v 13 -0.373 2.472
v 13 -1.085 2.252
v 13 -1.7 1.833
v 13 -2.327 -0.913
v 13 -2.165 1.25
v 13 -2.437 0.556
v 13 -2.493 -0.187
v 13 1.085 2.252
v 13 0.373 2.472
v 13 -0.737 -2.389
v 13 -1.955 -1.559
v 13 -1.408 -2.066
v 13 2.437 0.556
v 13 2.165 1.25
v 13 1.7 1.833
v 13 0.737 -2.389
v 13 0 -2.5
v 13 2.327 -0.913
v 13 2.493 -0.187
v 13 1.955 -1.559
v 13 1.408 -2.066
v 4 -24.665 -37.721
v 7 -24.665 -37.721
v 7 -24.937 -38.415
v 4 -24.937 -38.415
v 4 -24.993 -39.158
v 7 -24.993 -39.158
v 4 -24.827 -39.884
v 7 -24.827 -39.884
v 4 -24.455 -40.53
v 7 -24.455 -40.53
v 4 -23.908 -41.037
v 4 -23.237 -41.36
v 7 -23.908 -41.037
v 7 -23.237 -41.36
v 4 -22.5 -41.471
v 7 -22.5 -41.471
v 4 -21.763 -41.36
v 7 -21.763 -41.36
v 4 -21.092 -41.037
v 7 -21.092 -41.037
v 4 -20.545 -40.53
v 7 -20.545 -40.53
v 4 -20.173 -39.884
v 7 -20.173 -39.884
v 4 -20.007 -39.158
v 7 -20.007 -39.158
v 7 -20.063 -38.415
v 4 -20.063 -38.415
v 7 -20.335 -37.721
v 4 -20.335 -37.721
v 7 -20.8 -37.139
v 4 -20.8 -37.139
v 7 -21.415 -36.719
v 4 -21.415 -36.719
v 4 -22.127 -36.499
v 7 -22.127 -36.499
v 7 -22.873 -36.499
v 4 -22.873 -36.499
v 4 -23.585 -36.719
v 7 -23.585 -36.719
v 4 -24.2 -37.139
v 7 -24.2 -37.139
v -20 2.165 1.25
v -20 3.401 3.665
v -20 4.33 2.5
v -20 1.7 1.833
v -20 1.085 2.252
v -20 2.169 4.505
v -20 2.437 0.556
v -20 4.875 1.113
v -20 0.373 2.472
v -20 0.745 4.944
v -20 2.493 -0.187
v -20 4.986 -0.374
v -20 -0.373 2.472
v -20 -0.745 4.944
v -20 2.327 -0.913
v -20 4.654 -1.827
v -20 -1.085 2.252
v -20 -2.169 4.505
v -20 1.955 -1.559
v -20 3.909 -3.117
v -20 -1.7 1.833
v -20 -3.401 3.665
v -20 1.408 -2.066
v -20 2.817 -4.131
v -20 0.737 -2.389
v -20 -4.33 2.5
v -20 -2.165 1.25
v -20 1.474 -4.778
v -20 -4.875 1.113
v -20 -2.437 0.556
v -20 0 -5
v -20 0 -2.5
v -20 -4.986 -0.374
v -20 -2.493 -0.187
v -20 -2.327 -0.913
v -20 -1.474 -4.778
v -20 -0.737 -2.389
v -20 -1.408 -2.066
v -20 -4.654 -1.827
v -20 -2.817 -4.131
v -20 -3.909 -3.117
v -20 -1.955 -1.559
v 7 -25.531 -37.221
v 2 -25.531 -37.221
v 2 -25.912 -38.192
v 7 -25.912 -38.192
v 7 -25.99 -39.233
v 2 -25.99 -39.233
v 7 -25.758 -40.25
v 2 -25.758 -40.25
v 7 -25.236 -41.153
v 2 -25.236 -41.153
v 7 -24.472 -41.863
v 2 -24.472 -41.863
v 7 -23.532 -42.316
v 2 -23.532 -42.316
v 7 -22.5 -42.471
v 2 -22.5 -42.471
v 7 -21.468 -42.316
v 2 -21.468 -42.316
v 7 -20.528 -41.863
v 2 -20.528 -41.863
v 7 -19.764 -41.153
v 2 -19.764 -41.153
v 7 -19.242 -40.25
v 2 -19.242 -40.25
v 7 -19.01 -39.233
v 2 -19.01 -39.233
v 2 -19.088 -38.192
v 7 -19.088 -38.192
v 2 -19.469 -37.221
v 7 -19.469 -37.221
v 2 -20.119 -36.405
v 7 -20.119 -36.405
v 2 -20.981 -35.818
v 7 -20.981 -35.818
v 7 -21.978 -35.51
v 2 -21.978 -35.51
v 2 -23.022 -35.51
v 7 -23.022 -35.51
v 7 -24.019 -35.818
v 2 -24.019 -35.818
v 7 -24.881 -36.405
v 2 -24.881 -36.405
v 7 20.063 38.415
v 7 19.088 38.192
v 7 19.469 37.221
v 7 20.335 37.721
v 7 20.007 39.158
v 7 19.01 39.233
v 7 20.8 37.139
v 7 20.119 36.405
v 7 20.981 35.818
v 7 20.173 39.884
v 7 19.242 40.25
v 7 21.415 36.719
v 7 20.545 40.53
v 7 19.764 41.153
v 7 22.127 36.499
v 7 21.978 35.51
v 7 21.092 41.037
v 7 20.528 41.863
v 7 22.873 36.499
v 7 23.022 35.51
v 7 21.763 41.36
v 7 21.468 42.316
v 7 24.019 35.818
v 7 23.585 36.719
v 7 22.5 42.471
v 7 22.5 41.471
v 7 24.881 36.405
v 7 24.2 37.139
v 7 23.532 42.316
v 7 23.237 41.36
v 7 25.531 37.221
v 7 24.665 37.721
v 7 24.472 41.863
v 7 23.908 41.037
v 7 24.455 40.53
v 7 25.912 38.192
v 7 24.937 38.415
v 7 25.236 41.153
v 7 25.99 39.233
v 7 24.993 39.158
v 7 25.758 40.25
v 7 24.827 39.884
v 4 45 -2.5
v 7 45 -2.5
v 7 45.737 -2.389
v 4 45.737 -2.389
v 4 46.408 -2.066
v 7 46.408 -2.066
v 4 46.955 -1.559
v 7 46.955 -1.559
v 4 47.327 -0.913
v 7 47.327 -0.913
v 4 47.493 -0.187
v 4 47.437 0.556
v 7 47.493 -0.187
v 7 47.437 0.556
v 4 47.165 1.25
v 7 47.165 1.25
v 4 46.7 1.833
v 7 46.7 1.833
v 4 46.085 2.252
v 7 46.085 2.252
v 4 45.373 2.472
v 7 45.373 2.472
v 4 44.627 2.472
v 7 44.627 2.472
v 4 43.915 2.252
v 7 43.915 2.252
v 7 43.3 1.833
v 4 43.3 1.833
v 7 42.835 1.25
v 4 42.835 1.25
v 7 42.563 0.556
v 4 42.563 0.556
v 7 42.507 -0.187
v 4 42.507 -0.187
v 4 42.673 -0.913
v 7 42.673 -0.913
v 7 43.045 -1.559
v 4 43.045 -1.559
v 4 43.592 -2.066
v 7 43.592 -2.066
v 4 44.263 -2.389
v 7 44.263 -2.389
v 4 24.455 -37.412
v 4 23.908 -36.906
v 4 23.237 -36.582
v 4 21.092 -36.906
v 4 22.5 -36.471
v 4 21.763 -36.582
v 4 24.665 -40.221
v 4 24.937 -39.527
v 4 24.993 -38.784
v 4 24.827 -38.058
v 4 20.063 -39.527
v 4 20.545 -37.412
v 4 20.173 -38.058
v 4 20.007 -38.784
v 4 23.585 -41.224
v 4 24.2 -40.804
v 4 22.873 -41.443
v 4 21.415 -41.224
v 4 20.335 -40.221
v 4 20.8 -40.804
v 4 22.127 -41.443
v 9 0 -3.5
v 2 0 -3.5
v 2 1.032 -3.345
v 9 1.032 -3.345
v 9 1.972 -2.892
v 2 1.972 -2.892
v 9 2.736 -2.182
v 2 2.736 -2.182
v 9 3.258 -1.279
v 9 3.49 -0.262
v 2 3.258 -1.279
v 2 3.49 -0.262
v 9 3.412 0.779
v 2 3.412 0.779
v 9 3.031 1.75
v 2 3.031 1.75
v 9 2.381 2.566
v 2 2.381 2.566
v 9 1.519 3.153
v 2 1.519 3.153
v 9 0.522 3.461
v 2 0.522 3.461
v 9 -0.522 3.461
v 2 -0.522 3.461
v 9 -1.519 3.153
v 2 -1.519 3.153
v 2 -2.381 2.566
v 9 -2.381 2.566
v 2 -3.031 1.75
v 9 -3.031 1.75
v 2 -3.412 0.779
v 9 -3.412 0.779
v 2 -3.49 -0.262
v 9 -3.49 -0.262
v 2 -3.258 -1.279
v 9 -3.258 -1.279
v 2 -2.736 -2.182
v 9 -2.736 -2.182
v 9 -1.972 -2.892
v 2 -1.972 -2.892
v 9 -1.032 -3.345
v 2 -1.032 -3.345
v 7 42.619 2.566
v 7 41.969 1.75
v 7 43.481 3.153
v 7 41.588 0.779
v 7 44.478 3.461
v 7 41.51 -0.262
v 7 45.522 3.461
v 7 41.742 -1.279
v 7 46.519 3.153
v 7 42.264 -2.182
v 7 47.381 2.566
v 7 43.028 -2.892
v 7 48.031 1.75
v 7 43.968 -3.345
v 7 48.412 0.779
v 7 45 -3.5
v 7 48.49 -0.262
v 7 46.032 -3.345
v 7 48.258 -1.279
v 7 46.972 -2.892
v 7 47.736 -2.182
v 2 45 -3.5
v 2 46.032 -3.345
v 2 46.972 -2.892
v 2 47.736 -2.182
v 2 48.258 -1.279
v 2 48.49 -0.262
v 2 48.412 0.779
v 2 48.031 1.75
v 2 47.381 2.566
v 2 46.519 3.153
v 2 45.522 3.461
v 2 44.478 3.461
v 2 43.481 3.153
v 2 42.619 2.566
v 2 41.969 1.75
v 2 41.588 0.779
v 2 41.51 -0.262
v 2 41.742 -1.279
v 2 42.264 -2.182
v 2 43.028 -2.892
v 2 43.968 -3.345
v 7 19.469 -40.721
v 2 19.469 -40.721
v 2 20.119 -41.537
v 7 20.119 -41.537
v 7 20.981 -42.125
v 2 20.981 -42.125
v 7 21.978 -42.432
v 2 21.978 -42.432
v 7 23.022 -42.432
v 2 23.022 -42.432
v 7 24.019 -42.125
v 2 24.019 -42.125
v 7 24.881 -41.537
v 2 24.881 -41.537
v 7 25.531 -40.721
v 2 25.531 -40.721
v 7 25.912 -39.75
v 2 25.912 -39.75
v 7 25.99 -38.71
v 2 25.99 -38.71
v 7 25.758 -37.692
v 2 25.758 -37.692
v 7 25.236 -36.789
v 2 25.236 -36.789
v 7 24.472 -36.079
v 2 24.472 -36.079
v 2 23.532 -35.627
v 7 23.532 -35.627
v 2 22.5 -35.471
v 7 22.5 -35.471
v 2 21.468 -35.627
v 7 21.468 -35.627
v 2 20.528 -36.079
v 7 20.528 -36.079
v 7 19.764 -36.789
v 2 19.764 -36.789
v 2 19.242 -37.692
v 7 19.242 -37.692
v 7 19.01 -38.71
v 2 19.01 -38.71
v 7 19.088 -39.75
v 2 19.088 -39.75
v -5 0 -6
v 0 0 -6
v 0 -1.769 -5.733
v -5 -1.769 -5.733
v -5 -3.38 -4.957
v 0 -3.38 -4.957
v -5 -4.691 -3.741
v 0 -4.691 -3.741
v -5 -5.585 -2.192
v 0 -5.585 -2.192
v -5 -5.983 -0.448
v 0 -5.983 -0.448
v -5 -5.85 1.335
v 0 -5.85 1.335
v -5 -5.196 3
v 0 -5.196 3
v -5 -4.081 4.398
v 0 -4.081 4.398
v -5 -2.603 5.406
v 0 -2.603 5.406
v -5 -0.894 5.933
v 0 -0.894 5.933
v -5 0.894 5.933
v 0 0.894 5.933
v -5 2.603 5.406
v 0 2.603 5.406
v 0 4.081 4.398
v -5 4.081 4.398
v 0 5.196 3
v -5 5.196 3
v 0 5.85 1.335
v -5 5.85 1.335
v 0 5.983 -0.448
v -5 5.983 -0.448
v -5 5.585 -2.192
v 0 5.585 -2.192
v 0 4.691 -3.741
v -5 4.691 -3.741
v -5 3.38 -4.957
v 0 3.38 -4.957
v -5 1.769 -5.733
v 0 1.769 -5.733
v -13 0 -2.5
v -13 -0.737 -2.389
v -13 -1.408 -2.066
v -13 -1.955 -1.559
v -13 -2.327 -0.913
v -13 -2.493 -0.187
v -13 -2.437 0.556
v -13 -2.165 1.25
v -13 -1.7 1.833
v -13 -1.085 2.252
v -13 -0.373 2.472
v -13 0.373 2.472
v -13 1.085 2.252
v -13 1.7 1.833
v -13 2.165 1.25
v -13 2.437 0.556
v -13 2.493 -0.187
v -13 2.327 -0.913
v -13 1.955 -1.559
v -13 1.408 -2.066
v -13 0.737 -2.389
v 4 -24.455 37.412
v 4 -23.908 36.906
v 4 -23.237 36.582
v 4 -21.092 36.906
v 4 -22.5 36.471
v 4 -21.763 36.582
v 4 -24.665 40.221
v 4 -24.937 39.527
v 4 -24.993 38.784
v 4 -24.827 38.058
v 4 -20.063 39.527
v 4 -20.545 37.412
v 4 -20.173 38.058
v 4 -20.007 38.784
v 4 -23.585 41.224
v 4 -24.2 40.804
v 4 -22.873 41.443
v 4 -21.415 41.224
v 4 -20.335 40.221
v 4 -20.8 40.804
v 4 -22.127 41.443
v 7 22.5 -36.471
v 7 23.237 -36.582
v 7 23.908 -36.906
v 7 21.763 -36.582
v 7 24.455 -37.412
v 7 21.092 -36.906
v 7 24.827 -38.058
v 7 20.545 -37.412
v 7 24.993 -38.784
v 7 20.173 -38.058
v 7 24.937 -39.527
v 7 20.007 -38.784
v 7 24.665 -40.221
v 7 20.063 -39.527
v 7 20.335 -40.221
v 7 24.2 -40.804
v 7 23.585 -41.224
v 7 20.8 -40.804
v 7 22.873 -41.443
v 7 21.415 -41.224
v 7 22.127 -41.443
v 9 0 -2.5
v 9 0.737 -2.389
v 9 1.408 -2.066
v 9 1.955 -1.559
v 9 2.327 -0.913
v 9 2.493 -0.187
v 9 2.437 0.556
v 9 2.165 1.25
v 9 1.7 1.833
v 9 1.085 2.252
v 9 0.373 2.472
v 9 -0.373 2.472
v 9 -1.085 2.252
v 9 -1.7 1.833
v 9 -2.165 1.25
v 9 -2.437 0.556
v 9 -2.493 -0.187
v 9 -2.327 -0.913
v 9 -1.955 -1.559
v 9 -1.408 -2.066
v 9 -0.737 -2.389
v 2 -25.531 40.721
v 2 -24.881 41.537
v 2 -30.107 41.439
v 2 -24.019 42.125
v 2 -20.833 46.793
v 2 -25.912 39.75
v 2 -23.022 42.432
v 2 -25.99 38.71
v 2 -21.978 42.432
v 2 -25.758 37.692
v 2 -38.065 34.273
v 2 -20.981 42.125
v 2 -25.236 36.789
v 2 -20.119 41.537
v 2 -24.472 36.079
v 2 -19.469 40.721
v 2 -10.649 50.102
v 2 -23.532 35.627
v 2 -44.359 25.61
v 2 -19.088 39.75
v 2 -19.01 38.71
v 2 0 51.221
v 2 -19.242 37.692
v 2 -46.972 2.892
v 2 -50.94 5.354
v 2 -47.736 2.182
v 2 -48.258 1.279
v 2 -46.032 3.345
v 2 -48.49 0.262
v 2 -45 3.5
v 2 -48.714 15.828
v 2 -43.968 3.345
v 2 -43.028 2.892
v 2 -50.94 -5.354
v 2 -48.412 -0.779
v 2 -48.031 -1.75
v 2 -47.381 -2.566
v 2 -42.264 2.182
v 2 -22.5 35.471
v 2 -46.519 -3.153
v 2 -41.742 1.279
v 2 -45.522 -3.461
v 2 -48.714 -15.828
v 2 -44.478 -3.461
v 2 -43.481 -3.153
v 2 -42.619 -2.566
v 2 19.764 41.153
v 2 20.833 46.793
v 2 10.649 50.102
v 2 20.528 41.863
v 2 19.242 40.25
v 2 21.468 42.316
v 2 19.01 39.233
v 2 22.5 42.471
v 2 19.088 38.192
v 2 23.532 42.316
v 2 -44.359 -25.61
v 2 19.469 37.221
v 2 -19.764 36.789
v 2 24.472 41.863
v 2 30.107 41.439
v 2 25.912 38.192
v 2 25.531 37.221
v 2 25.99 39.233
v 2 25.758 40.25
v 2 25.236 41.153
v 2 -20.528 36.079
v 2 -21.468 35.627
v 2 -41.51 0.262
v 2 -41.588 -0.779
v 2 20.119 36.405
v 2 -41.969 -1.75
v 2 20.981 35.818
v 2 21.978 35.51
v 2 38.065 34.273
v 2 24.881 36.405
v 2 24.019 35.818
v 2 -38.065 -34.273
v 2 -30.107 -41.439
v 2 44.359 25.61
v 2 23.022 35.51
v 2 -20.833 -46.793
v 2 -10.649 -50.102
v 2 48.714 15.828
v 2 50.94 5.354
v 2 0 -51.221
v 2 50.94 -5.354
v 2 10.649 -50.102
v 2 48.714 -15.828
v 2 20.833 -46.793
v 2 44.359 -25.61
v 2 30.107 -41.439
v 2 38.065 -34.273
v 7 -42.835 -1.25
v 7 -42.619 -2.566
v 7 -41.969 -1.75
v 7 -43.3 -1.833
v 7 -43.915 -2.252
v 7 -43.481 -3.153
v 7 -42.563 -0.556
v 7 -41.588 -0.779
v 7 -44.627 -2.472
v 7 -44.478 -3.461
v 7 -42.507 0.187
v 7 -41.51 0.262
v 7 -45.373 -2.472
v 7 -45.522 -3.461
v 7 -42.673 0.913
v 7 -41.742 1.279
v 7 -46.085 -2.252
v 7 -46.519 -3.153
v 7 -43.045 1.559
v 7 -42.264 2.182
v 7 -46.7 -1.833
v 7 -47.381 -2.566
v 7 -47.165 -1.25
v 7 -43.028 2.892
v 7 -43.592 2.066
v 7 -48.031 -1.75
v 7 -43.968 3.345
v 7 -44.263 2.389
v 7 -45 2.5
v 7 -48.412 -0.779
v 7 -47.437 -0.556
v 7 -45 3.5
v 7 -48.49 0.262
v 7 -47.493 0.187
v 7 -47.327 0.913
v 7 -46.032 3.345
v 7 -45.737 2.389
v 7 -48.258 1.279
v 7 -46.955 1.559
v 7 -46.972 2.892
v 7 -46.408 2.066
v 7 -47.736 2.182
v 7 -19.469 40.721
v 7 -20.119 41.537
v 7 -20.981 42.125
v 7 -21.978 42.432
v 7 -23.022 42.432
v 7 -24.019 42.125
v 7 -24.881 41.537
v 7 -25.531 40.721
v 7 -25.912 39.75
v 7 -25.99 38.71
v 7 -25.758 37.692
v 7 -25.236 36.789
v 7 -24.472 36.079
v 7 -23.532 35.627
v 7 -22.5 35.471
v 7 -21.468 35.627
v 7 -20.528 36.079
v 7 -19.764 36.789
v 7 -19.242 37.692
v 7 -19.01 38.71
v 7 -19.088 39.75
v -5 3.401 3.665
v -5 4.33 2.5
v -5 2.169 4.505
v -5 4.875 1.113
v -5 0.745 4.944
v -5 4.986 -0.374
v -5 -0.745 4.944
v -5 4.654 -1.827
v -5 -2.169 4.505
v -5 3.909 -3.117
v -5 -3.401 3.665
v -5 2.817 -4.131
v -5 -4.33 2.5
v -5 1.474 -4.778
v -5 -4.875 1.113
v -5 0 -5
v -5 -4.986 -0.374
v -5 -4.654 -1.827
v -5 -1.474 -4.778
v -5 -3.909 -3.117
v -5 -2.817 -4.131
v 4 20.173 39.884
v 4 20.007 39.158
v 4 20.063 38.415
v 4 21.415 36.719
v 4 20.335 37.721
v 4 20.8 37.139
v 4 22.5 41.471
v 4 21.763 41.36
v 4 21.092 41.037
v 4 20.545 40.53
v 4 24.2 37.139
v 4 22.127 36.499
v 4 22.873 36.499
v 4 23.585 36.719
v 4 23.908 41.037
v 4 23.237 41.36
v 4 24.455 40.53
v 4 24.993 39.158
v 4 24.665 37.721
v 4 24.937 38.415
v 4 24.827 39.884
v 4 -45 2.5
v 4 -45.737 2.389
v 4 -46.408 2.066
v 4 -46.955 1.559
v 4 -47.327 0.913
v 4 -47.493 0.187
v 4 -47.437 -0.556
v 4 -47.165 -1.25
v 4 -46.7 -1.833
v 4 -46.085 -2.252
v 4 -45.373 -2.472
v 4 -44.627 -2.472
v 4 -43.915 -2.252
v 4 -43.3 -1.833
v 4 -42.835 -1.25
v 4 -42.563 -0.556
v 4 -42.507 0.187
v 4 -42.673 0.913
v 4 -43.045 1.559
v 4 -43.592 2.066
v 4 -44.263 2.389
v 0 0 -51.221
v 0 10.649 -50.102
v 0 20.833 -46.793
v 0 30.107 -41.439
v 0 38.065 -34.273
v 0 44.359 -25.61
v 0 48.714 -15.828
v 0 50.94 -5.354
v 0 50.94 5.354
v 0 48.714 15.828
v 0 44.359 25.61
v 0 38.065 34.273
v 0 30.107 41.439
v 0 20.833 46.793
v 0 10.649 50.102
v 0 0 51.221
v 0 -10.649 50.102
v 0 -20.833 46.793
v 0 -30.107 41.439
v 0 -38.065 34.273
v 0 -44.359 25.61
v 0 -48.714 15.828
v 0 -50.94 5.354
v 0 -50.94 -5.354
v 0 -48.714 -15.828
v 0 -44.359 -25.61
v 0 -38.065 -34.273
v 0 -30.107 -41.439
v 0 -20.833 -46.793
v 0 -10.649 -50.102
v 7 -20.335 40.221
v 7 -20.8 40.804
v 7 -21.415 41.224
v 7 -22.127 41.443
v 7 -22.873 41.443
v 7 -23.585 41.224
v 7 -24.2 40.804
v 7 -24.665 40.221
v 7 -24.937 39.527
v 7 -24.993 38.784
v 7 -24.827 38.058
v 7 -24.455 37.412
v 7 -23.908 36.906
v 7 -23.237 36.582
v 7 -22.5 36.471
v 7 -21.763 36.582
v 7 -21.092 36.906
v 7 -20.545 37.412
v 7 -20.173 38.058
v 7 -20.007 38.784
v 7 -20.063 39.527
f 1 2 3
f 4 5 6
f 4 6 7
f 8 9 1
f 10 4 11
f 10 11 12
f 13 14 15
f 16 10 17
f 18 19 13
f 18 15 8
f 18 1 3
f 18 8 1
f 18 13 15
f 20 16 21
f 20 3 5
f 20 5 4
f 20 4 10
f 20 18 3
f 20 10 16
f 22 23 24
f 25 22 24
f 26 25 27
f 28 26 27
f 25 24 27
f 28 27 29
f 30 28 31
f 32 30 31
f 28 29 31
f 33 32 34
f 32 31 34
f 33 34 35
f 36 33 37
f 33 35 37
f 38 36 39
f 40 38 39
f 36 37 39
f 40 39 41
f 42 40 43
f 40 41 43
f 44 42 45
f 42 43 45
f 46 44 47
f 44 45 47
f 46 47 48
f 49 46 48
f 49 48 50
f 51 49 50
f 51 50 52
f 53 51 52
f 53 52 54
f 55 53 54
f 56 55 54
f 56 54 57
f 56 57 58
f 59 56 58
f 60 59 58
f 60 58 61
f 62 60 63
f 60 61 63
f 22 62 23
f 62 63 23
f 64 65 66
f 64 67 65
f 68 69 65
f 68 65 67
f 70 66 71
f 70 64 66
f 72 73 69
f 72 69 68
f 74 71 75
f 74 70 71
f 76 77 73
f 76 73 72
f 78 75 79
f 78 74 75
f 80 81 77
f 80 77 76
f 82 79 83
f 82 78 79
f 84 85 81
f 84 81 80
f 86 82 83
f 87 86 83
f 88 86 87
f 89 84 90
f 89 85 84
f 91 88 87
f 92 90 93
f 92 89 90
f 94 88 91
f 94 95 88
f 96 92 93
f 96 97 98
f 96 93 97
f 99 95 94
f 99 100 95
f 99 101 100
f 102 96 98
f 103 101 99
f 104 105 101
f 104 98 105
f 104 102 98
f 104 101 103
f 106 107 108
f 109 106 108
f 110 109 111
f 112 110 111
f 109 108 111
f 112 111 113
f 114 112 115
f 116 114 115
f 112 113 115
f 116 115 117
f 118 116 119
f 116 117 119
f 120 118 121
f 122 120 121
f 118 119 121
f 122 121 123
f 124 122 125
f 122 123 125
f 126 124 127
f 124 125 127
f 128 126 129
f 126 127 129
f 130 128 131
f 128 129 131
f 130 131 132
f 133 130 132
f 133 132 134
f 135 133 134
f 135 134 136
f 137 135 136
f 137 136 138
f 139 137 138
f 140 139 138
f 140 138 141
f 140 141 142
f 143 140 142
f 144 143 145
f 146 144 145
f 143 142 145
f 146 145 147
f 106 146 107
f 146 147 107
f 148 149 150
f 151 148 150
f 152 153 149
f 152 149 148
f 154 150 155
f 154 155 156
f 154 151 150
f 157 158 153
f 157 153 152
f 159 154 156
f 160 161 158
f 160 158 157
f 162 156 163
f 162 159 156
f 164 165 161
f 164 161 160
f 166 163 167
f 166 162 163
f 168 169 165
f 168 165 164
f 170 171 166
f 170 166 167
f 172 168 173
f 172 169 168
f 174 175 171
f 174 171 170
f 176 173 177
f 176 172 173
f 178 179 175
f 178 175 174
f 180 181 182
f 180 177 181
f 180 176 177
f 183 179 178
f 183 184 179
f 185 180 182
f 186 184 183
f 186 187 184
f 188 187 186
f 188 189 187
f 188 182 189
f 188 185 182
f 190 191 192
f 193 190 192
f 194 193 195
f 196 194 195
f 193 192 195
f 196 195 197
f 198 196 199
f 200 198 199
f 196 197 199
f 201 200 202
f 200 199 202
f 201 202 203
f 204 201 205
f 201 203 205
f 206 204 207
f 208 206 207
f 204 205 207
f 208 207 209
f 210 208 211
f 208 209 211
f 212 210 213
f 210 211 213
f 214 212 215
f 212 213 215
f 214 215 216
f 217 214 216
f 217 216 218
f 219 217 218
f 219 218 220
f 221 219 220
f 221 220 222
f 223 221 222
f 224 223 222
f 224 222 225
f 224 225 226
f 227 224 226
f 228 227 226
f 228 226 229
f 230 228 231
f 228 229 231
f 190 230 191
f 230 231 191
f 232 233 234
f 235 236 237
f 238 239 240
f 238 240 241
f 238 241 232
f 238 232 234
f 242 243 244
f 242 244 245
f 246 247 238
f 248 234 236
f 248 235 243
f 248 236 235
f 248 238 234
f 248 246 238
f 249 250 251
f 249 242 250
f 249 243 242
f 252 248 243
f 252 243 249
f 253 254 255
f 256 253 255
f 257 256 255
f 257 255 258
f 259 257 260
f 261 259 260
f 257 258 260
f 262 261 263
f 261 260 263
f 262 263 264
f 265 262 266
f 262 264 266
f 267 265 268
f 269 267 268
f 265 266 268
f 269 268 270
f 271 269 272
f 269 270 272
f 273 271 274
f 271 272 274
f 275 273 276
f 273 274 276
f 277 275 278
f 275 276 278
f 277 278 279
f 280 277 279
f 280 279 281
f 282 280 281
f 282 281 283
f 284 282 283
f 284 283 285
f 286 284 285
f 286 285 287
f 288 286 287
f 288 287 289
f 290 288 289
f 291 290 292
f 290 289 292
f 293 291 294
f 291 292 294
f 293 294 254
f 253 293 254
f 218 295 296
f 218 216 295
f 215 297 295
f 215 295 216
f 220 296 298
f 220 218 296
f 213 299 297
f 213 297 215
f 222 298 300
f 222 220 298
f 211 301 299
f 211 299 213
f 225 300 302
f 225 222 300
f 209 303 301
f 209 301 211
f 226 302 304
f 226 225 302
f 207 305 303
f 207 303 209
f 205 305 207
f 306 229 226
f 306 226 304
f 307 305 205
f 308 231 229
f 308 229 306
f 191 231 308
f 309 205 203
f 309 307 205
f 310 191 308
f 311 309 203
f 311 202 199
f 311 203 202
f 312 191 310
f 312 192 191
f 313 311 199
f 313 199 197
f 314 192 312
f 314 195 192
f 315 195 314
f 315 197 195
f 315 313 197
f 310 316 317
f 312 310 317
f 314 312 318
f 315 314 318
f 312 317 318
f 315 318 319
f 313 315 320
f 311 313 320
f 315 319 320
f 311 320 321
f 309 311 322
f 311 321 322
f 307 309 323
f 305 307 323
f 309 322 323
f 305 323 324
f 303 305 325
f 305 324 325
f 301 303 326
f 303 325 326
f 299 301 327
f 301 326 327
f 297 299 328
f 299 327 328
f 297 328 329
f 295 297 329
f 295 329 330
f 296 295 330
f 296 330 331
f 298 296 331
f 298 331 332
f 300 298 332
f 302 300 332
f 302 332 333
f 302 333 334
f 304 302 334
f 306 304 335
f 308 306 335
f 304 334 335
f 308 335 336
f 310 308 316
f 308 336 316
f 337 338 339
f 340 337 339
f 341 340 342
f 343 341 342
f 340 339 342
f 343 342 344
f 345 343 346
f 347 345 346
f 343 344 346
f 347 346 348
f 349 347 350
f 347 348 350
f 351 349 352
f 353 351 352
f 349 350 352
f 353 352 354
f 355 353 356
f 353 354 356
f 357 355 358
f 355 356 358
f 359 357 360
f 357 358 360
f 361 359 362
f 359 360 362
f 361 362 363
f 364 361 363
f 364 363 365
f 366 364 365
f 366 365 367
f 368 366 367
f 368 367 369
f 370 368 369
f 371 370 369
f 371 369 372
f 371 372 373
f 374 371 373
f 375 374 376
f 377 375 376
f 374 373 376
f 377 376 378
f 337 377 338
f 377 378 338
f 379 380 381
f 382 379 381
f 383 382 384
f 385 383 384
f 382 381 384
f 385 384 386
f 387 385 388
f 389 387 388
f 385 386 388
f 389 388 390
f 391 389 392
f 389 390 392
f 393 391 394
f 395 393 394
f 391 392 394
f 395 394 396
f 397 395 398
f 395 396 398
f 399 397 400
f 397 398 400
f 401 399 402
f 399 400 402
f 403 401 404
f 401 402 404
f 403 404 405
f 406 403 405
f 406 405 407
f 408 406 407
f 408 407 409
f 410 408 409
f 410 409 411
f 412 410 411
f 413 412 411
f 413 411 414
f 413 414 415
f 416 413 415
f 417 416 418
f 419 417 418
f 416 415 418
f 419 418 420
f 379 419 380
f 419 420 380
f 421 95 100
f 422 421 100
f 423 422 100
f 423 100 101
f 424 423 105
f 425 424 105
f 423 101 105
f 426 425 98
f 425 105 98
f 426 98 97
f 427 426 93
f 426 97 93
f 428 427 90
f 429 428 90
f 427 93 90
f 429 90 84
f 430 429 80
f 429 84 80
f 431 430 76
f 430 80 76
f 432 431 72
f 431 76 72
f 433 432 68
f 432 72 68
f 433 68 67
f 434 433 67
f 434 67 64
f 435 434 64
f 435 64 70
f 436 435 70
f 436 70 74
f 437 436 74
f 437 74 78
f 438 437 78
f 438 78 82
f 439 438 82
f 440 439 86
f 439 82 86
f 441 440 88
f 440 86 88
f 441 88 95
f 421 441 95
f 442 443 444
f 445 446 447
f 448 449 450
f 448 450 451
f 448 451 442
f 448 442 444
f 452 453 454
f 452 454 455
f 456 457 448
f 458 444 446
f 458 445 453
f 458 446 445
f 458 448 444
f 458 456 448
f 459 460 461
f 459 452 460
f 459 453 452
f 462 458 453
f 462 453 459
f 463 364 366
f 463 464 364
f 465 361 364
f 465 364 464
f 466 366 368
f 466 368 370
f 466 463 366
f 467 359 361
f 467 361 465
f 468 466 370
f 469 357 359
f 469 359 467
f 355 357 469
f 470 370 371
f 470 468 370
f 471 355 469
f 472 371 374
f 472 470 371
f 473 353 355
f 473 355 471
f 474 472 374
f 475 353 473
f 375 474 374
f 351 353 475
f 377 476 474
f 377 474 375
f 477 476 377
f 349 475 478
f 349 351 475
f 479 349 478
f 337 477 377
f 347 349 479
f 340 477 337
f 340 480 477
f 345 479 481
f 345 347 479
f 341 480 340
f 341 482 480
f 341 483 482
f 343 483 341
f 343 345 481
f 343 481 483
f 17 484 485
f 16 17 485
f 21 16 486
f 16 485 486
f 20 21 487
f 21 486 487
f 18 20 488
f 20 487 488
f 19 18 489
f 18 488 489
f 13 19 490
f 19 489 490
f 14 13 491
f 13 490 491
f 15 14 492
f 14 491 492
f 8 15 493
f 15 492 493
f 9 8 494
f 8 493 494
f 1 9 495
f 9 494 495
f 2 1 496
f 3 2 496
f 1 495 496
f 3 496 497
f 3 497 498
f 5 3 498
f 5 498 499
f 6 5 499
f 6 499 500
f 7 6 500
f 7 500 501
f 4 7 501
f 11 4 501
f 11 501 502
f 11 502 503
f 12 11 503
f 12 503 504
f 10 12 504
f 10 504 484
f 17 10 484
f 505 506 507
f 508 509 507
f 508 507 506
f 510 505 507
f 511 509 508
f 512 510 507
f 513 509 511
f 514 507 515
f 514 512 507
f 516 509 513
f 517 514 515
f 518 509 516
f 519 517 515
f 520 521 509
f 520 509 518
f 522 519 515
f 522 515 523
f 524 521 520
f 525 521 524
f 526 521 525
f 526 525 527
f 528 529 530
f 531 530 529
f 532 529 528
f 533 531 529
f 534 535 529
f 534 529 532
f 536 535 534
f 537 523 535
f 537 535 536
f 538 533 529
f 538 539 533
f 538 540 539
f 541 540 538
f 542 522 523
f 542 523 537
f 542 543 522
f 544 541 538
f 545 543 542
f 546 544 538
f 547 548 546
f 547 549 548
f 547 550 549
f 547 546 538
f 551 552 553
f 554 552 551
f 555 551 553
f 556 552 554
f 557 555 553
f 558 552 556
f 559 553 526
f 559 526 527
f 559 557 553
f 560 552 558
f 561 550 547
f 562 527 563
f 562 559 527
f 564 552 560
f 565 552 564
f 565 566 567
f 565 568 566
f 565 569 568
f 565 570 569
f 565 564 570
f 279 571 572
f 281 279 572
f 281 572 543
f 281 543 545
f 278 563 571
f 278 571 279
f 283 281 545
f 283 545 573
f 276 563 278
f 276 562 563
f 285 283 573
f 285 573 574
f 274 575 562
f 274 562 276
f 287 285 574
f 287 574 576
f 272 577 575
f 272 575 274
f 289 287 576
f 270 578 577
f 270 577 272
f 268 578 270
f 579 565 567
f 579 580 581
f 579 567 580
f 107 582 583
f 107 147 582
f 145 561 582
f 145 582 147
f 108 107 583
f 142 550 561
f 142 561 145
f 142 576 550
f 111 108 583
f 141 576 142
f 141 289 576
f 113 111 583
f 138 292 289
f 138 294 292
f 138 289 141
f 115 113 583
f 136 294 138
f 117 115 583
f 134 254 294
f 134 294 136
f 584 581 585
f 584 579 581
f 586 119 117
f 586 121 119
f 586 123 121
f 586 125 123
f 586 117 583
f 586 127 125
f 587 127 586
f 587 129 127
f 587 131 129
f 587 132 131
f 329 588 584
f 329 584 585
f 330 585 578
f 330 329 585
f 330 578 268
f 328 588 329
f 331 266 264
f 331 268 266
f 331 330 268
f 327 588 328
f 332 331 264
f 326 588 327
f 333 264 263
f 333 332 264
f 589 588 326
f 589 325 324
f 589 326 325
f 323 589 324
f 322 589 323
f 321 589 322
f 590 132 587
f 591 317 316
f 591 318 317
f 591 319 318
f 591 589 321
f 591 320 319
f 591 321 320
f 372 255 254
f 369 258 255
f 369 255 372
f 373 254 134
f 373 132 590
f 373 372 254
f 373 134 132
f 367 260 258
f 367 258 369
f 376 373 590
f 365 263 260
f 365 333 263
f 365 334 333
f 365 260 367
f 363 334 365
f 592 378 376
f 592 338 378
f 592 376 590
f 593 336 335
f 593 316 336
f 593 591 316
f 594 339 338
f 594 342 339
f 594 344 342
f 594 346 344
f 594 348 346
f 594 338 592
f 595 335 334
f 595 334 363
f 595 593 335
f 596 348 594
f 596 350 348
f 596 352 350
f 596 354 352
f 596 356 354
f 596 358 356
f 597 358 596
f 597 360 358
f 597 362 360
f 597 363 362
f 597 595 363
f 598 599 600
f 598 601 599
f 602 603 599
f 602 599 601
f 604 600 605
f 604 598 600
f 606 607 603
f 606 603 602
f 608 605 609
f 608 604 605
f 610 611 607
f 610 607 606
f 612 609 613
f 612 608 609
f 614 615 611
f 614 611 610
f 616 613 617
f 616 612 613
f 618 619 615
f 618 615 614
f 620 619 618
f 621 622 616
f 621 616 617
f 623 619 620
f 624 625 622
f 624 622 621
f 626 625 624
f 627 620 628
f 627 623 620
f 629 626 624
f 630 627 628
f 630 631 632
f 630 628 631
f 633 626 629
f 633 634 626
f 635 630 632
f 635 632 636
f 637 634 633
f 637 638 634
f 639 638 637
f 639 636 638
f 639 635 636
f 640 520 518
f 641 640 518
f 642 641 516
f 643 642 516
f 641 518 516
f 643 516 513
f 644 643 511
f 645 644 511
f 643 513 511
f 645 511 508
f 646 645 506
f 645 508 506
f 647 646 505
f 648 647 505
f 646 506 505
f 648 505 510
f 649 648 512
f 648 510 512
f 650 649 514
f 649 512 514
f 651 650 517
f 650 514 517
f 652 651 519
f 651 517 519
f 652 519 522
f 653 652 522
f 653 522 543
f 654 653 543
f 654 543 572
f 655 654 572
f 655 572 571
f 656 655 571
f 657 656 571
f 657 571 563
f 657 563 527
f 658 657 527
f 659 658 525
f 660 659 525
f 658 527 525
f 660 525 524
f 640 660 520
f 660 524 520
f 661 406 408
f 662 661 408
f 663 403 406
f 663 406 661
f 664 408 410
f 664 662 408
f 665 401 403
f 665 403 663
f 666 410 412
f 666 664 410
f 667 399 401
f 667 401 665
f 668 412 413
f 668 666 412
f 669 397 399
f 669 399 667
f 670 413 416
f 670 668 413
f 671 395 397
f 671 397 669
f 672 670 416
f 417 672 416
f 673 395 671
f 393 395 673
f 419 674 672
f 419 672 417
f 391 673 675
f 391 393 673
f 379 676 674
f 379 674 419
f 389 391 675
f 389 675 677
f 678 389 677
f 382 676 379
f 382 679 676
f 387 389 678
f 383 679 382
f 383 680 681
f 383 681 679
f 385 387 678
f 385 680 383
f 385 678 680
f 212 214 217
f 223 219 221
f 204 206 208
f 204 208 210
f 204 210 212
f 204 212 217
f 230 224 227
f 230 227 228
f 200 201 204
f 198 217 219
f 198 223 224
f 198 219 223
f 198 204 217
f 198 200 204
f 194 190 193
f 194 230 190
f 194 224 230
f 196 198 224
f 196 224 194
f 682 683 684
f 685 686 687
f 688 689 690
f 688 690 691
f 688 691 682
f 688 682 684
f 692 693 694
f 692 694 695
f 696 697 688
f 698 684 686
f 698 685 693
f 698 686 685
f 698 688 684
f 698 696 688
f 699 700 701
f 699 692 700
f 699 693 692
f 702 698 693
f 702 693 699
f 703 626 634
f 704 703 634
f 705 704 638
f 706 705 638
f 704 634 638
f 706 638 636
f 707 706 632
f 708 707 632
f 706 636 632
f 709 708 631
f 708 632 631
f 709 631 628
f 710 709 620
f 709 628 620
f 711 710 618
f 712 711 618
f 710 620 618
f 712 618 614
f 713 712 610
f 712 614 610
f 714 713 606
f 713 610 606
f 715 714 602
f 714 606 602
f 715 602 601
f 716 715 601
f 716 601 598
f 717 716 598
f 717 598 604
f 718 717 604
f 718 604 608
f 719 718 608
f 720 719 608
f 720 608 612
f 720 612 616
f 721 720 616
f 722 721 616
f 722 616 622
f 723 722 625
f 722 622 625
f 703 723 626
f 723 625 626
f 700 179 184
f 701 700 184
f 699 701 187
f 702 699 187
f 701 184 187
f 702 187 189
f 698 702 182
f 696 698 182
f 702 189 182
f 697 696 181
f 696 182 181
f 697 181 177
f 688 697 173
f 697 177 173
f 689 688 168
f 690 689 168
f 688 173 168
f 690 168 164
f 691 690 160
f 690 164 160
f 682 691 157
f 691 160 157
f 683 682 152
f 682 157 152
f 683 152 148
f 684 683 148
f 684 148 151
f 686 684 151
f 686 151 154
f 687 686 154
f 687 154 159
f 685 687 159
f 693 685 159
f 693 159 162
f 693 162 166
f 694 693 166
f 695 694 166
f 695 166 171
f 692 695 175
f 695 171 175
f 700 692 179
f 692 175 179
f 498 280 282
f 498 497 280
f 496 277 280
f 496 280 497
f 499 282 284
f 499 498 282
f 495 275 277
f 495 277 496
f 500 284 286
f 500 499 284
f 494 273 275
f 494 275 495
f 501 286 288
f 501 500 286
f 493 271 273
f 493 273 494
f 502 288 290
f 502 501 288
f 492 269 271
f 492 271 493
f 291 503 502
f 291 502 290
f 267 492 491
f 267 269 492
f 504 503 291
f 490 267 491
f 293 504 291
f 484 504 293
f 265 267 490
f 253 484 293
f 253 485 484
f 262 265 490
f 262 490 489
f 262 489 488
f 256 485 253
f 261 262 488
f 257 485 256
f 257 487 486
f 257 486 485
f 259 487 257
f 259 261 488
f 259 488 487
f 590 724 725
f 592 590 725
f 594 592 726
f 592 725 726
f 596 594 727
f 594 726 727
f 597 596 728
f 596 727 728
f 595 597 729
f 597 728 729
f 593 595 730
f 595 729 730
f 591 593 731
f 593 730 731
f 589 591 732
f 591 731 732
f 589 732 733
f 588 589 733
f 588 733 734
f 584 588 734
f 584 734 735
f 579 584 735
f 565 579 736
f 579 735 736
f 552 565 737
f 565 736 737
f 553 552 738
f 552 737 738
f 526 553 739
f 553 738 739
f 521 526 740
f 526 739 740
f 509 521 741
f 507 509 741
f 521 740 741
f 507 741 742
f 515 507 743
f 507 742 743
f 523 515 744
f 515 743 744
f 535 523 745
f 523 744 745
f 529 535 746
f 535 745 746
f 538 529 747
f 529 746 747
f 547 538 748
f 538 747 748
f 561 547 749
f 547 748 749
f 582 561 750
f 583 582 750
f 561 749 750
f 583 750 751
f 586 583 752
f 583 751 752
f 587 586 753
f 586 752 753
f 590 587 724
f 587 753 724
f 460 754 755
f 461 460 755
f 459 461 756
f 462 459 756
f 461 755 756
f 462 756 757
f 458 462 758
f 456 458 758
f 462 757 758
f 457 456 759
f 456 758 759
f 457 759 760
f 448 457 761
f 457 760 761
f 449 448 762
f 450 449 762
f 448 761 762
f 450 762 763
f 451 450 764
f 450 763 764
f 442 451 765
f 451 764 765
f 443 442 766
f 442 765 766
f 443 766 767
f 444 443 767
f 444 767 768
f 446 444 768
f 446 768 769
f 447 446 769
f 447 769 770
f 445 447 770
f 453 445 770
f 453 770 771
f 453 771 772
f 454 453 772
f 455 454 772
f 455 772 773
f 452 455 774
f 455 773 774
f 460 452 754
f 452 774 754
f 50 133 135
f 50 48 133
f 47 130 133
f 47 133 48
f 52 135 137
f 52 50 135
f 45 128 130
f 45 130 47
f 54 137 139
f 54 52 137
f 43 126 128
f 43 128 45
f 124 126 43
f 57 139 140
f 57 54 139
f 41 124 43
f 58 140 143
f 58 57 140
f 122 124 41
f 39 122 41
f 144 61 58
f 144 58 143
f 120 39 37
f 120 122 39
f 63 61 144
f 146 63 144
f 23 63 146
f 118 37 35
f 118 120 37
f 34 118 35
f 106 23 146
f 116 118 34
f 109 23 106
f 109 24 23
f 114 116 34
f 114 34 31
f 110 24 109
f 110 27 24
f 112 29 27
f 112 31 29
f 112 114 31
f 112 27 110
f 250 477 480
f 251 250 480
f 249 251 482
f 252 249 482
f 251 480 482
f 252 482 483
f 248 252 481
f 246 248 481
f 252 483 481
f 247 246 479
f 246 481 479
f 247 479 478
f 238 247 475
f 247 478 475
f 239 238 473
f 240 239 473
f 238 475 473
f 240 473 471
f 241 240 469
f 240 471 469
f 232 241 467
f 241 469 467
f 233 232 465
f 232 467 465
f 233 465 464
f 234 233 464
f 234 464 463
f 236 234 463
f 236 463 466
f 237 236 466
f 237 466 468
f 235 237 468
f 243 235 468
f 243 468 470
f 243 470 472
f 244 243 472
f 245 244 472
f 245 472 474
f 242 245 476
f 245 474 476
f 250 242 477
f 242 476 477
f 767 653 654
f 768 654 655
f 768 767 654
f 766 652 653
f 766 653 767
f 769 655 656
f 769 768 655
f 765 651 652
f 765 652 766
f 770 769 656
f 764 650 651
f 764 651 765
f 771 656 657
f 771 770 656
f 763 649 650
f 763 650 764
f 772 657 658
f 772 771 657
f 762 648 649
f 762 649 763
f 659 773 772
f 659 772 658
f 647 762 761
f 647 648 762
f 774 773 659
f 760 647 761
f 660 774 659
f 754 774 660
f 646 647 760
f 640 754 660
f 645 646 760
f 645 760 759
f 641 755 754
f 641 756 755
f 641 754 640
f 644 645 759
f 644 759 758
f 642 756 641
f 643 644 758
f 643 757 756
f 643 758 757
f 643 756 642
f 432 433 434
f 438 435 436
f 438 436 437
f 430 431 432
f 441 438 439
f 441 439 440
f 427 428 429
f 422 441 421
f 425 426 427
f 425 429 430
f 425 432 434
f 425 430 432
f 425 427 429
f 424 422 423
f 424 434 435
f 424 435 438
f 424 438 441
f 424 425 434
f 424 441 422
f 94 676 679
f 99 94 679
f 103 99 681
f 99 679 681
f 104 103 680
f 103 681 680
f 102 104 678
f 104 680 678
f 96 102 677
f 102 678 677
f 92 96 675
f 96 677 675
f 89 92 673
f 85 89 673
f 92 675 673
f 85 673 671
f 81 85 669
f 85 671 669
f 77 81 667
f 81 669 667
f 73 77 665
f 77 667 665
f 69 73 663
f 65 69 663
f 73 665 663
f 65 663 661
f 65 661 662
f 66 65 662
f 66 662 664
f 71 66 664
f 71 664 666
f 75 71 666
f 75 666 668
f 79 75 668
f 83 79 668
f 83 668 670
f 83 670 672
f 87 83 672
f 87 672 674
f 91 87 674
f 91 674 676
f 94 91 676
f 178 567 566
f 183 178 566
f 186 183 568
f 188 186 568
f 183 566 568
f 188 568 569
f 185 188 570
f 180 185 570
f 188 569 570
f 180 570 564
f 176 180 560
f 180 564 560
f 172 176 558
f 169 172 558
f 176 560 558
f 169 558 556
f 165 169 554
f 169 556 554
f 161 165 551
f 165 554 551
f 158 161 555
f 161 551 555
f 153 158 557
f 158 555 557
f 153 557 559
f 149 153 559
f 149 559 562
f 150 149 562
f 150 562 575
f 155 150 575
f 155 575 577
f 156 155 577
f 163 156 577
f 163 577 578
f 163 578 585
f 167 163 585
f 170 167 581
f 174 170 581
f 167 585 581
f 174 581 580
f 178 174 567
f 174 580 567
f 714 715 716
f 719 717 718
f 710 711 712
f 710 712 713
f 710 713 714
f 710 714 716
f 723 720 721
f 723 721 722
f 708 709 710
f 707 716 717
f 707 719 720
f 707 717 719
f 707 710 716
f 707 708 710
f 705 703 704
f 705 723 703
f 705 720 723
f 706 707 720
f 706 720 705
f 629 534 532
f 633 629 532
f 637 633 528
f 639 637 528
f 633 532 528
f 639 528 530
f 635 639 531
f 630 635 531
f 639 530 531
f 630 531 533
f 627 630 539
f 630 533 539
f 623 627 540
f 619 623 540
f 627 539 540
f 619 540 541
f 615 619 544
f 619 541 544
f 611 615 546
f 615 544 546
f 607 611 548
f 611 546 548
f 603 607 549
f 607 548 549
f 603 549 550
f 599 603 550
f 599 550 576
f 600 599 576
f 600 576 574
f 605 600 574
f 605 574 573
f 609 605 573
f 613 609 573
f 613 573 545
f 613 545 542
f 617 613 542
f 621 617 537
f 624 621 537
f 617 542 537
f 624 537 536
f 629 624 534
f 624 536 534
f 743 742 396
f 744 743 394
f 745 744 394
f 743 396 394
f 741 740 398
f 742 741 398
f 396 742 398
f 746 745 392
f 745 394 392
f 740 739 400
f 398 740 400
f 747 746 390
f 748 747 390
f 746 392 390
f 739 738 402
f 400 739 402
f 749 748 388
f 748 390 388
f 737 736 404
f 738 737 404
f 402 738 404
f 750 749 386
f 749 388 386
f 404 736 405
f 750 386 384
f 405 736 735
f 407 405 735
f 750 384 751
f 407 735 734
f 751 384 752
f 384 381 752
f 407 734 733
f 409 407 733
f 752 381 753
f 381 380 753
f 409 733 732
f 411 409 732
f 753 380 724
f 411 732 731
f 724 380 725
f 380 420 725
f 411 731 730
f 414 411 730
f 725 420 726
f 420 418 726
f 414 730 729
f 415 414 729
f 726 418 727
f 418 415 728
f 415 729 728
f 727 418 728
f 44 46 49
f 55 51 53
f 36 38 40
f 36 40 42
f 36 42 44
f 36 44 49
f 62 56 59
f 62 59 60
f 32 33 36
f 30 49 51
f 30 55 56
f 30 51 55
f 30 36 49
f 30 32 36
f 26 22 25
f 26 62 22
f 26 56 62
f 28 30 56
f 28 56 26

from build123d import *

# Parameters (mm, degrees)
SKETCH_1_R               = 51.220940725
EXTRUDE_1_DEPTH          = 2
SKETCH_2_R               = 3.5
EXTRUDE_2_DEPTH          = 5
PATTERN_CIRCULAR_1_COUNT = 6
SKETCH_3_R               = 2.5
CUT_EXTRUDE_1_DEPTH      = 3
PATTERN_CIRCULAR_2_COUNT = 6
SKETCH_4_R               = 2.5
EXTRUDE_3_DEPTH          = 11
SKETCH_5_R               = 3.5
EXTRUDE_4_DEPTH          = 7
SKETCH_6_R               = 5
EXTRUDE_5_DEPTH          = 20
SKETCH_7_R               = 6
EXTRUDE_6_DEPTH          = 5
SKETCH_8_R               = 2.5
CUT_EXTRUDE_2_DEPTH      = 7


with BuildPart() as part:
    # 草图1 → 凸台-拉伸1 (new body)
    with BuildSketch(Plane(origin=(0, 0, 0), x_dir=(0, 0, -1), z_dir=(1, 0, 0))):
        Circle(SKETCH_1_R)
    extrude(amount=EXTRUDE_1_DEPTH)

    # 草图2 → 凸台-拉伸2 (add)
    with BuildSketch(Plane(origin=(2, 0, 0), x_dir=(0, 0, -1), z_dir=(1, 0, 0))):
        with Locations((0, 45)):
            Circle(SKETCH_2_R)
    extrude_2 = extrude(amount=EXTRUDE_2_DEPTH)

    # 阵列(圆周)1: 凸台-拉伸2 ×6 about axis
    pattern_circular_1_axis = Axis((0, 0, 0), (1, 0, 0))
    for i in range(1, PATTERN_CIRCULAR_1_COUNT):
        add(extrude_2.rotate(pattern_circular_1_axis, i * 360 / PATTERN_CIRCULAR_1_COUNT))

    # 草图3 → 切除-拉伸1 (cut)
    with BuildSketch(Plane(origin=(7, 0, 0), x_dir=(0, 0, -1), z_dir=(1, 0, 0))):
        with Locations((0, 45)):
            Circle(SKETCH_3_R)
    cut_extrude_1 = extrude(amount=-CUT_EXTRUDE_1_DEPTH, mode=Mode.SUBTRACT)

    # 阵列(圆周)2: 切除-拉伸1 ×6 about axis
    pattern_circular_2_axis = Axis((0, 0, 0), (1, 0, 0))
    for i in range(1, PATTERN_CIRCULAR_2_COUNT):
        add(cut_extrude_1.rotate(pattern_circular_2_axis, i * 360 / PATTERN_CIRCULAR_2_COUNT), mode=Mode.SUBTRACT)

    # 草图4 → 凸台-拉伸3 (add)
    with BuildSketch(Plane(origin=(2, 0, 0), x_dir=(0, 0, -1), z_dir=(1, 0, 0))):
        Circle(SKETCH_4_R)
    extrude(amount=EXTRUDE_3_DEPTH)

    # 草图5 → 凸台-拉伸4 (add)
    with BuildSketch(Plane(origin=(2, 0, 0), x_dir=(0, 0, -1), z_dir=(1, 0, 0))):
        Circle(SKETCH_5_R)
    extrude(amount=EXTRUDE_4_DEPTH)

    # 草图6 → 凸台-拉伸5 (add)
    with BuildSketch(Plane.ZY):
        with Locations(Location((0, 0, 0), (0, 0, 180))):
            Circle(SKETCH_6_R)
    extrude(amount=EXTRUDE_5_DEPTH)

    # 草图7 → 凸台-拉伸6 (add)
    with BuildSketch(Plane.ZY):
        with Locations(Location((0, 0, 0), (0, 0, 180))):
            Circle(SKETCH_7_R)
    extrude(amount=EXTRUDE_6_DEPTH)

    # 草图8 → 切除-拉伸2 (cut)
    with BuildSketch(Plane.ZY.offset(20)):
        with Locations(Location((0, 0, 0), (0, 0, 180))):
            Circle(SKETCH_8_R)
    extrude(amount=-CUT_EXTRUDE_2_DEPTH, mode=Mode.SUBTRACT)


solid = part.part
